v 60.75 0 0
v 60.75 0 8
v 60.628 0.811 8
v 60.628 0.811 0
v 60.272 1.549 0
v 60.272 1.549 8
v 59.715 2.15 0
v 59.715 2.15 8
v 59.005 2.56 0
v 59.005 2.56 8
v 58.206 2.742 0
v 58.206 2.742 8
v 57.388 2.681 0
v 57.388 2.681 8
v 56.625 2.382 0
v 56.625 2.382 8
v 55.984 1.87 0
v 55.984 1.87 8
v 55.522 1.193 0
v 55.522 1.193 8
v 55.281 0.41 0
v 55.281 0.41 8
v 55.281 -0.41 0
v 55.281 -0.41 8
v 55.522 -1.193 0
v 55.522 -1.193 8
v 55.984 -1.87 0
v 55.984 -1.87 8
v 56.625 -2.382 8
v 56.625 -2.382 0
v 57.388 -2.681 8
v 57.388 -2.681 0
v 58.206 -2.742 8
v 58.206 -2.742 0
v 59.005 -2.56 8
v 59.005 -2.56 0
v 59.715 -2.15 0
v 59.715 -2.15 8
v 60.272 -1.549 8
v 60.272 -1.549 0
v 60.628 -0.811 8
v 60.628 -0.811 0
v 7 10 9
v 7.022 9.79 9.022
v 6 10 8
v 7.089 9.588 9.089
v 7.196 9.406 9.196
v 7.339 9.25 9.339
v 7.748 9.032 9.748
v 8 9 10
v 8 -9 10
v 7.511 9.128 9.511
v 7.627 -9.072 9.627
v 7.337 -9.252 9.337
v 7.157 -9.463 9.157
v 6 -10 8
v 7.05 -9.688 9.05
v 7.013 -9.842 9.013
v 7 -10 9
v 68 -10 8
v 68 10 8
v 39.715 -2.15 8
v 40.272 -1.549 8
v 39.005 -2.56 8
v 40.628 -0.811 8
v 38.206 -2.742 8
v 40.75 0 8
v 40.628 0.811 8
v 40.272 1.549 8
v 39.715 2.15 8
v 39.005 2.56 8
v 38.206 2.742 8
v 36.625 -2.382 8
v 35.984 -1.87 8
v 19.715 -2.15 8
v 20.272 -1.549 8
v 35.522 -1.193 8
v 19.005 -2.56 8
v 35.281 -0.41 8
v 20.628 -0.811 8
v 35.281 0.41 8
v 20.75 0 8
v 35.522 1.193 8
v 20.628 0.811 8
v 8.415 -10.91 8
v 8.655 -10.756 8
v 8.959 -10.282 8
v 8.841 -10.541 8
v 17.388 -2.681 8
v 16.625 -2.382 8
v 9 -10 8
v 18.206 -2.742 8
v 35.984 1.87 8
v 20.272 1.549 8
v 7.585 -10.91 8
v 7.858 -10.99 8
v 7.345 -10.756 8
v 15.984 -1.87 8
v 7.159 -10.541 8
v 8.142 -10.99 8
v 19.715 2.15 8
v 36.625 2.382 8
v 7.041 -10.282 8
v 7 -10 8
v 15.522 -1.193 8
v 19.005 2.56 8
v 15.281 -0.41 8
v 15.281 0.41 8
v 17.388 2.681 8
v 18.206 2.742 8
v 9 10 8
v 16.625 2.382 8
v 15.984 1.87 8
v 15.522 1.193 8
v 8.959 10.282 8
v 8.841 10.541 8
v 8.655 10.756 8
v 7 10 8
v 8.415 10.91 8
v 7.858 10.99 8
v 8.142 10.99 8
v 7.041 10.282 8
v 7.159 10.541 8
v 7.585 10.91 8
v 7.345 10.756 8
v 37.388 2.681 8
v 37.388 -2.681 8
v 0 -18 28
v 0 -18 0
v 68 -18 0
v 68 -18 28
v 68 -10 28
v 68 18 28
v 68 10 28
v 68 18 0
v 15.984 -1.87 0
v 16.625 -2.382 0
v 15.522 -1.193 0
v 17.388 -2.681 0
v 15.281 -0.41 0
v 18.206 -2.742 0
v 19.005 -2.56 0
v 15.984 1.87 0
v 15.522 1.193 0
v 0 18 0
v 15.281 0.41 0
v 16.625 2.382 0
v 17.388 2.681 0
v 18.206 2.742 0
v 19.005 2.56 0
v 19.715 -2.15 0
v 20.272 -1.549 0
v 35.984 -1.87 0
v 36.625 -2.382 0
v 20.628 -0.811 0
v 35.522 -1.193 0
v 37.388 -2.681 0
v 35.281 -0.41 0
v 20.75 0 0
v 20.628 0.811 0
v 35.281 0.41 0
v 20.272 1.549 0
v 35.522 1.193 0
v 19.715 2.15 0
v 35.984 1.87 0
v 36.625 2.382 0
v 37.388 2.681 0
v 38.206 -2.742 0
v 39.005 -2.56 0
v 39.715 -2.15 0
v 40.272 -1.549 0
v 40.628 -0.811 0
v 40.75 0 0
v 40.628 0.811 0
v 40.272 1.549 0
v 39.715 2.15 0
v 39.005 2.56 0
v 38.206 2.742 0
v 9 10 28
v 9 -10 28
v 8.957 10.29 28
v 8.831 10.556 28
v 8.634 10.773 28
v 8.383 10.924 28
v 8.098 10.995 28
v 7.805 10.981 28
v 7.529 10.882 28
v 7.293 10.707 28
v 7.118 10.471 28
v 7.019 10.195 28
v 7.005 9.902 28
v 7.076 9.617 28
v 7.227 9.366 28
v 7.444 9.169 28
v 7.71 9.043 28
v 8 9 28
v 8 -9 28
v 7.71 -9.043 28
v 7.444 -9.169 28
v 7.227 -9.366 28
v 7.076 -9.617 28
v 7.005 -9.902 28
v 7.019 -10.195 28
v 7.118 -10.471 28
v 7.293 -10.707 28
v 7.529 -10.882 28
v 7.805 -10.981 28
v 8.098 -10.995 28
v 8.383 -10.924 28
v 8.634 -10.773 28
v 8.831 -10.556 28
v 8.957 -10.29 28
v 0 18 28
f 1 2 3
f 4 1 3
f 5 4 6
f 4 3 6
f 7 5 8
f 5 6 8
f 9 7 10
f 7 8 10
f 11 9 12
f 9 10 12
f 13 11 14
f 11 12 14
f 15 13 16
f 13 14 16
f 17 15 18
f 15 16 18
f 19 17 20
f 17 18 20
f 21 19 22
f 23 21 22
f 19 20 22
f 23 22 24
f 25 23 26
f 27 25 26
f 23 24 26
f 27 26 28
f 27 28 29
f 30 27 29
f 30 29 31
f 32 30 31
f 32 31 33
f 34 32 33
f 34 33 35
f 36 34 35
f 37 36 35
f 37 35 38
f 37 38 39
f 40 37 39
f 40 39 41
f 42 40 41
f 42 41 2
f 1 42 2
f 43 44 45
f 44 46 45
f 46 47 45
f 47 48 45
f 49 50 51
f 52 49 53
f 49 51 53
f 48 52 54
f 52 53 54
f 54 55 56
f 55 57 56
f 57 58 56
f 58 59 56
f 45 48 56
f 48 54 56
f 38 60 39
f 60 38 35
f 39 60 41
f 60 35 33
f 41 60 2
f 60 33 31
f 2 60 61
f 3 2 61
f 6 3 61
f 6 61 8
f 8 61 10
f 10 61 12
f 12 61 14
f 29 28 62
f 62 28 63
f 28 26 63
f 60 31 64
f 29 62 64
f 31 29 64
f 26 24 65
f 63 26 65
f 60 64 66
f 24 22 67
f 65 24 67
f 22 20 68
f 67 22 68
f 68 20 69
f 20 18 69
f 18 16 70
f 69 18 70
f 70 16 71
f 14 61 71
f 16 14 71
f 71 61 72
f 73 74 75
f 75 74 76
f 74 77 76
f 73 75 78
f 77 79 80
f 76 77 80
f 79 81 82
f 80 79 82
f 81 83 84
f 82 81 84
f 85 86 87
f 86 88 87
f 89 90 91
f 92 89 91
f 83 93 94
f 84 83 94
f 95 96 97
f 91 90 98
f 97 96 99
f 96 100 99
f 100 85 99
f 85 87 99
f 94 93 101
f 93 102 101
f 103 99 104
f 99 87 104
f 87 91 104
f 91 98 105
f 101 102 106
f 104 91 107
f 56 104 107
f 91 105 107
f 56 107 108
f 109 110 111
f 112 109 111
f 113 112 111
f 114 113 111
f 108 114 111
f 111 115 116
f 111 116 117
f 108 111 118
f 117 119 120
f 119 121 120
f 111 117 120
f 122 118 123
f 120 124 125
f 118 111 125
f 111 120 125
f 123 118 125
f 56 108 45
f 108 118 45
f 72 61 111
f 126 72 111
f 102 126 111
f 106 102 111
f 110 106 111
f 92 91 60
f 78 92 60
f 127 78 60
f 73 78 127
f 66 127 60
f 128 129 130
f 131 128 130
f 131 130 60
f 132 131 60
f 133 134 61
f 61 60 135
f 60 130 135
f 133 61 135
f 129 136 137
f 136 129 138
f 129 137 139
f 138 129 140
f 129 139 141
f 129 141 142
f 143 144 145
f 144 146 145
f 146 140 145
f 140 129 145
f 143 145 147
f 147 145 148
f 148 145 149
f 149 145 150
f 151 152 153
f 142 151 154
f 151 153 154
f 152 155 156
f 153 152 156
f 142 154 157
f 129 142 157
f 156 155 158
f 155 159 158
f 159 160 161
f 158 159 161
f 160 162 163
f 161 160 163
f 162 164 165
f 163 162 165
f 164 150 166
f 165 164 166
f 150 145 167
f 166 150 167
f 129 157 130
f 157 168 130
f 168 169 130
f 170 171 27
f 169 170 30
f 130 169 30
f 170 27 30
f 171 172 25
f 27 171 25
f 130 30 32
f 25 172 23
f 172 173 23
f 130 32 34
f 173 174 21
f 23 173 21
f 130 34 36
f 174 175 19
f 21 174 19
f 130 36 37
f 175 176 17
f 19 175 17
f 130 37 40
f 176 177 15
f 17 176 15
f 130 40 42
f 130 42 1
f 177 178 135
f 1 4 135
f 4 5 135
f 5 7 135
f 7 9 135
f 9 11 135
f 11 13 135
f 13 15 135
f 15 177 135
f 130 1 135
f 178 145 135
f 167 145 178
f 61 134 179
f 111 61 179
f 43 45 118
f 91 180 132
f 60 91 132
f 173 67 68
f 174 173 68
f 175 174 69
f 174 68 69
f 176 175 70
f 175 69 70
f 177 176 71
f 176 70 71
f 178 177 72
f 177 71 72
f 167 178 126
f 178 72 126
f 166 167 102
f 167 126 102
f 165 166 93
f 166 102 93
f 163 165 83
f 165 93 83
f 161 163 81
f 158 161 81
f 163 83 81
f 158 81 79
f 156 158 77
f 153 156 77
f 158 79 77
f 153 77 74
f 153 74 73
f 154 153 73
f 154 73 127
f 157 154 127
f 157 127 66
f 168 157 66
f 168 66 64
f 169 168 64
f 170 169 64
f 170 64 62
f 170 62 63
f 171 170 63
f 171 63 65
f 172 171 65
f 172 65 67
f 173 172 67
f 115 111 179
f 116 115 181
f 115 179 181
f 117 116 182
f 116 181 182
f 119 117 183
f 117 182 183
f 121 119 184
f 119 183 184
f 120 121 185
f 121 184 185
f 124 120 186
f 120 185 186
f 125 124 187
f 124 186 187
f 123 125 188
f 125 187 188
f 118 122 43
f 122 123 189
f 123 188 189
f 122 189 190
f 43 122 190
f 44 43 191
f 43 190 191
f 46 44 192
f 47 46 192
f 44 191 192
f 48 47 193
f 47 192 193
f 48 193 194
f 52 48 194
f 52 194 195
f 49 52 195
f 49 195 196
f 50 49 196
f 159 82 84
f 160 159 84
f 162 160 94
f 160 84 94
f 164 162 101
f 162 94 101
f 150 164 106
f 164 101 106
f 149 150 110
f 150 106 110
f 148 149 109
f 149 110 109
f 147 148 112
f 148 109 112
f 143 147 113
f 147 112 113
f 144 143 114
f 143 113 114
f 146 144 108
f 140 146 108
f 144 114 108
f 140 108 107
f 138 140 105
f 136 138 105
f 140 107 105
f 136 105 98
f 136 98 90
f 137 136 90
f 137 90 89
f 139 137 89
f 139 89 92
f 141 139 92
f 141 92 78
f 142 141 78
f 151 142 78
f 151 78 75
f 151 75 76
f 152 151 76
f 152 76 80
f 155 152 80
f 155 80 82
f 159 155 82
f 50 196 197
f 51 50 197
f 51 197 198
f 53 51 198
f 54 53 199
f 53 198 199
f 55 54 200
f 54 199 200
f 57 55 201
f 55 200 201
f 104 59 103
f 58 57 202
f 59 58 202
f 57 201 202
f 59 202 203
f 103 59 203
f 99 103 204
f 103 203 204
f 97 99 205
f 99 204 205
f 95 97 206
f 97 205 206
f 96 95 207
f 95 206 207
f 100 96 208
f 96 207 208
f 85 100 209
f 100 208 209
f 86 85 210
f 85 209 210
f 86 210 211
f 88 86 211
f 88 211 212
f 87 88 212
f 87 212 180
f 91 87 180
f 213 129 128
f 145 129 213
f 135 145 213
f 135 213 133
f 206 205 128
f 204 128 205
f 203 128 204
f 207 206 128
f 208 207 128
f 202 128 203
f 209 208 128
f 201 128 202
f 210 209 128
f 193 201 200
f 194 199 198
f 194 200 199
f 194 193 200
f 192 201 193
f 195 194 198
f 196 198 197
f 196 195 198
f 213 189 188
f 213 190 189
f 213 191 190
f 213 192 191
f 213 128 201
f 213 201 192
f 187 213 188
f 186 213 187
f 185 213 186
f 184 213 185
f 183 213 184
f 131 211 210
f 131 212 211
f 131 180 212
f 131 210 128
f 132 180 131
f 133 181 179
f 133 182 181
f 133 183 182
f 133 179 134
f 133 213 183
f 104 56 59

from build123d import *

# Parameters (mm, degrees)
SKETCH_W        = 68
SKETCH_H        = 36
PAD_DEPTH       = 28
POCKET_DEPTH    = 20
SKETCH002_R     = 2.75
POCKET001_DEPTH = 28
POCKET002_DEPTH = 20


with BuildPart() as part:
    # Sketch → Pad (new body)
    with BuildSketch(Plane.XY):
        with Locations((34, 0)):
            Rectangle(SKETCH_W, SKETCH_H)
    extrude(amount=PAD_DEPTH)

    # Sketch001 (on DatumPlane) → Pocket (cut)
    with BuildSketch(Plane.XY.offset(28)):
        with BuildLine():
            Line((68, 10), (68, -10))
            Line((9, -10), (68, -10))
            ThreePointArc((8, -9), (7.292893, -10.707107), (9, -10))
            Line((8, 9), (8, -9))
            ThreePointArc((9, 10), (7.292893, 10.707107), (8, 9))
            Line((68, 10), (9, 10))
        make_face()
    extrude(amount=-POCKET_DEPTH, mode=Mode.SUBTRACT)

    # Sketch002 (on DatumPlane) → Pocket001 (cut)
    with BuildSketch(Plane.XY.offset(28)):
        with Locations((18, 0)):
            Circle(SKETCH002_R)
        with Locations((38, 0)):
            Circle(SKETCH002_R)
        with Locations((58, 0)):
            Circle(SKETCH002_R)
        with Locations((78, 0)):
            Circle(SKETCH002_R)
        with Locations((98, 0)):
            Circle(SKETCH002_R)
    extrude(amount=-POCKET001_DEPTH, mode=Mode.SUBTRACT)

    # Sketch003 (on DatumPlane) → Pocket002 (cut)
    with BuildSketch(Plane.XZ.offset(10)):
        Polygon((8, 8), (8, 10), (6, 8), align=None)
    extrude(amount=-POCKET002_DEPTH, mode=Mode.SUBTRACT)


solid = part.part
